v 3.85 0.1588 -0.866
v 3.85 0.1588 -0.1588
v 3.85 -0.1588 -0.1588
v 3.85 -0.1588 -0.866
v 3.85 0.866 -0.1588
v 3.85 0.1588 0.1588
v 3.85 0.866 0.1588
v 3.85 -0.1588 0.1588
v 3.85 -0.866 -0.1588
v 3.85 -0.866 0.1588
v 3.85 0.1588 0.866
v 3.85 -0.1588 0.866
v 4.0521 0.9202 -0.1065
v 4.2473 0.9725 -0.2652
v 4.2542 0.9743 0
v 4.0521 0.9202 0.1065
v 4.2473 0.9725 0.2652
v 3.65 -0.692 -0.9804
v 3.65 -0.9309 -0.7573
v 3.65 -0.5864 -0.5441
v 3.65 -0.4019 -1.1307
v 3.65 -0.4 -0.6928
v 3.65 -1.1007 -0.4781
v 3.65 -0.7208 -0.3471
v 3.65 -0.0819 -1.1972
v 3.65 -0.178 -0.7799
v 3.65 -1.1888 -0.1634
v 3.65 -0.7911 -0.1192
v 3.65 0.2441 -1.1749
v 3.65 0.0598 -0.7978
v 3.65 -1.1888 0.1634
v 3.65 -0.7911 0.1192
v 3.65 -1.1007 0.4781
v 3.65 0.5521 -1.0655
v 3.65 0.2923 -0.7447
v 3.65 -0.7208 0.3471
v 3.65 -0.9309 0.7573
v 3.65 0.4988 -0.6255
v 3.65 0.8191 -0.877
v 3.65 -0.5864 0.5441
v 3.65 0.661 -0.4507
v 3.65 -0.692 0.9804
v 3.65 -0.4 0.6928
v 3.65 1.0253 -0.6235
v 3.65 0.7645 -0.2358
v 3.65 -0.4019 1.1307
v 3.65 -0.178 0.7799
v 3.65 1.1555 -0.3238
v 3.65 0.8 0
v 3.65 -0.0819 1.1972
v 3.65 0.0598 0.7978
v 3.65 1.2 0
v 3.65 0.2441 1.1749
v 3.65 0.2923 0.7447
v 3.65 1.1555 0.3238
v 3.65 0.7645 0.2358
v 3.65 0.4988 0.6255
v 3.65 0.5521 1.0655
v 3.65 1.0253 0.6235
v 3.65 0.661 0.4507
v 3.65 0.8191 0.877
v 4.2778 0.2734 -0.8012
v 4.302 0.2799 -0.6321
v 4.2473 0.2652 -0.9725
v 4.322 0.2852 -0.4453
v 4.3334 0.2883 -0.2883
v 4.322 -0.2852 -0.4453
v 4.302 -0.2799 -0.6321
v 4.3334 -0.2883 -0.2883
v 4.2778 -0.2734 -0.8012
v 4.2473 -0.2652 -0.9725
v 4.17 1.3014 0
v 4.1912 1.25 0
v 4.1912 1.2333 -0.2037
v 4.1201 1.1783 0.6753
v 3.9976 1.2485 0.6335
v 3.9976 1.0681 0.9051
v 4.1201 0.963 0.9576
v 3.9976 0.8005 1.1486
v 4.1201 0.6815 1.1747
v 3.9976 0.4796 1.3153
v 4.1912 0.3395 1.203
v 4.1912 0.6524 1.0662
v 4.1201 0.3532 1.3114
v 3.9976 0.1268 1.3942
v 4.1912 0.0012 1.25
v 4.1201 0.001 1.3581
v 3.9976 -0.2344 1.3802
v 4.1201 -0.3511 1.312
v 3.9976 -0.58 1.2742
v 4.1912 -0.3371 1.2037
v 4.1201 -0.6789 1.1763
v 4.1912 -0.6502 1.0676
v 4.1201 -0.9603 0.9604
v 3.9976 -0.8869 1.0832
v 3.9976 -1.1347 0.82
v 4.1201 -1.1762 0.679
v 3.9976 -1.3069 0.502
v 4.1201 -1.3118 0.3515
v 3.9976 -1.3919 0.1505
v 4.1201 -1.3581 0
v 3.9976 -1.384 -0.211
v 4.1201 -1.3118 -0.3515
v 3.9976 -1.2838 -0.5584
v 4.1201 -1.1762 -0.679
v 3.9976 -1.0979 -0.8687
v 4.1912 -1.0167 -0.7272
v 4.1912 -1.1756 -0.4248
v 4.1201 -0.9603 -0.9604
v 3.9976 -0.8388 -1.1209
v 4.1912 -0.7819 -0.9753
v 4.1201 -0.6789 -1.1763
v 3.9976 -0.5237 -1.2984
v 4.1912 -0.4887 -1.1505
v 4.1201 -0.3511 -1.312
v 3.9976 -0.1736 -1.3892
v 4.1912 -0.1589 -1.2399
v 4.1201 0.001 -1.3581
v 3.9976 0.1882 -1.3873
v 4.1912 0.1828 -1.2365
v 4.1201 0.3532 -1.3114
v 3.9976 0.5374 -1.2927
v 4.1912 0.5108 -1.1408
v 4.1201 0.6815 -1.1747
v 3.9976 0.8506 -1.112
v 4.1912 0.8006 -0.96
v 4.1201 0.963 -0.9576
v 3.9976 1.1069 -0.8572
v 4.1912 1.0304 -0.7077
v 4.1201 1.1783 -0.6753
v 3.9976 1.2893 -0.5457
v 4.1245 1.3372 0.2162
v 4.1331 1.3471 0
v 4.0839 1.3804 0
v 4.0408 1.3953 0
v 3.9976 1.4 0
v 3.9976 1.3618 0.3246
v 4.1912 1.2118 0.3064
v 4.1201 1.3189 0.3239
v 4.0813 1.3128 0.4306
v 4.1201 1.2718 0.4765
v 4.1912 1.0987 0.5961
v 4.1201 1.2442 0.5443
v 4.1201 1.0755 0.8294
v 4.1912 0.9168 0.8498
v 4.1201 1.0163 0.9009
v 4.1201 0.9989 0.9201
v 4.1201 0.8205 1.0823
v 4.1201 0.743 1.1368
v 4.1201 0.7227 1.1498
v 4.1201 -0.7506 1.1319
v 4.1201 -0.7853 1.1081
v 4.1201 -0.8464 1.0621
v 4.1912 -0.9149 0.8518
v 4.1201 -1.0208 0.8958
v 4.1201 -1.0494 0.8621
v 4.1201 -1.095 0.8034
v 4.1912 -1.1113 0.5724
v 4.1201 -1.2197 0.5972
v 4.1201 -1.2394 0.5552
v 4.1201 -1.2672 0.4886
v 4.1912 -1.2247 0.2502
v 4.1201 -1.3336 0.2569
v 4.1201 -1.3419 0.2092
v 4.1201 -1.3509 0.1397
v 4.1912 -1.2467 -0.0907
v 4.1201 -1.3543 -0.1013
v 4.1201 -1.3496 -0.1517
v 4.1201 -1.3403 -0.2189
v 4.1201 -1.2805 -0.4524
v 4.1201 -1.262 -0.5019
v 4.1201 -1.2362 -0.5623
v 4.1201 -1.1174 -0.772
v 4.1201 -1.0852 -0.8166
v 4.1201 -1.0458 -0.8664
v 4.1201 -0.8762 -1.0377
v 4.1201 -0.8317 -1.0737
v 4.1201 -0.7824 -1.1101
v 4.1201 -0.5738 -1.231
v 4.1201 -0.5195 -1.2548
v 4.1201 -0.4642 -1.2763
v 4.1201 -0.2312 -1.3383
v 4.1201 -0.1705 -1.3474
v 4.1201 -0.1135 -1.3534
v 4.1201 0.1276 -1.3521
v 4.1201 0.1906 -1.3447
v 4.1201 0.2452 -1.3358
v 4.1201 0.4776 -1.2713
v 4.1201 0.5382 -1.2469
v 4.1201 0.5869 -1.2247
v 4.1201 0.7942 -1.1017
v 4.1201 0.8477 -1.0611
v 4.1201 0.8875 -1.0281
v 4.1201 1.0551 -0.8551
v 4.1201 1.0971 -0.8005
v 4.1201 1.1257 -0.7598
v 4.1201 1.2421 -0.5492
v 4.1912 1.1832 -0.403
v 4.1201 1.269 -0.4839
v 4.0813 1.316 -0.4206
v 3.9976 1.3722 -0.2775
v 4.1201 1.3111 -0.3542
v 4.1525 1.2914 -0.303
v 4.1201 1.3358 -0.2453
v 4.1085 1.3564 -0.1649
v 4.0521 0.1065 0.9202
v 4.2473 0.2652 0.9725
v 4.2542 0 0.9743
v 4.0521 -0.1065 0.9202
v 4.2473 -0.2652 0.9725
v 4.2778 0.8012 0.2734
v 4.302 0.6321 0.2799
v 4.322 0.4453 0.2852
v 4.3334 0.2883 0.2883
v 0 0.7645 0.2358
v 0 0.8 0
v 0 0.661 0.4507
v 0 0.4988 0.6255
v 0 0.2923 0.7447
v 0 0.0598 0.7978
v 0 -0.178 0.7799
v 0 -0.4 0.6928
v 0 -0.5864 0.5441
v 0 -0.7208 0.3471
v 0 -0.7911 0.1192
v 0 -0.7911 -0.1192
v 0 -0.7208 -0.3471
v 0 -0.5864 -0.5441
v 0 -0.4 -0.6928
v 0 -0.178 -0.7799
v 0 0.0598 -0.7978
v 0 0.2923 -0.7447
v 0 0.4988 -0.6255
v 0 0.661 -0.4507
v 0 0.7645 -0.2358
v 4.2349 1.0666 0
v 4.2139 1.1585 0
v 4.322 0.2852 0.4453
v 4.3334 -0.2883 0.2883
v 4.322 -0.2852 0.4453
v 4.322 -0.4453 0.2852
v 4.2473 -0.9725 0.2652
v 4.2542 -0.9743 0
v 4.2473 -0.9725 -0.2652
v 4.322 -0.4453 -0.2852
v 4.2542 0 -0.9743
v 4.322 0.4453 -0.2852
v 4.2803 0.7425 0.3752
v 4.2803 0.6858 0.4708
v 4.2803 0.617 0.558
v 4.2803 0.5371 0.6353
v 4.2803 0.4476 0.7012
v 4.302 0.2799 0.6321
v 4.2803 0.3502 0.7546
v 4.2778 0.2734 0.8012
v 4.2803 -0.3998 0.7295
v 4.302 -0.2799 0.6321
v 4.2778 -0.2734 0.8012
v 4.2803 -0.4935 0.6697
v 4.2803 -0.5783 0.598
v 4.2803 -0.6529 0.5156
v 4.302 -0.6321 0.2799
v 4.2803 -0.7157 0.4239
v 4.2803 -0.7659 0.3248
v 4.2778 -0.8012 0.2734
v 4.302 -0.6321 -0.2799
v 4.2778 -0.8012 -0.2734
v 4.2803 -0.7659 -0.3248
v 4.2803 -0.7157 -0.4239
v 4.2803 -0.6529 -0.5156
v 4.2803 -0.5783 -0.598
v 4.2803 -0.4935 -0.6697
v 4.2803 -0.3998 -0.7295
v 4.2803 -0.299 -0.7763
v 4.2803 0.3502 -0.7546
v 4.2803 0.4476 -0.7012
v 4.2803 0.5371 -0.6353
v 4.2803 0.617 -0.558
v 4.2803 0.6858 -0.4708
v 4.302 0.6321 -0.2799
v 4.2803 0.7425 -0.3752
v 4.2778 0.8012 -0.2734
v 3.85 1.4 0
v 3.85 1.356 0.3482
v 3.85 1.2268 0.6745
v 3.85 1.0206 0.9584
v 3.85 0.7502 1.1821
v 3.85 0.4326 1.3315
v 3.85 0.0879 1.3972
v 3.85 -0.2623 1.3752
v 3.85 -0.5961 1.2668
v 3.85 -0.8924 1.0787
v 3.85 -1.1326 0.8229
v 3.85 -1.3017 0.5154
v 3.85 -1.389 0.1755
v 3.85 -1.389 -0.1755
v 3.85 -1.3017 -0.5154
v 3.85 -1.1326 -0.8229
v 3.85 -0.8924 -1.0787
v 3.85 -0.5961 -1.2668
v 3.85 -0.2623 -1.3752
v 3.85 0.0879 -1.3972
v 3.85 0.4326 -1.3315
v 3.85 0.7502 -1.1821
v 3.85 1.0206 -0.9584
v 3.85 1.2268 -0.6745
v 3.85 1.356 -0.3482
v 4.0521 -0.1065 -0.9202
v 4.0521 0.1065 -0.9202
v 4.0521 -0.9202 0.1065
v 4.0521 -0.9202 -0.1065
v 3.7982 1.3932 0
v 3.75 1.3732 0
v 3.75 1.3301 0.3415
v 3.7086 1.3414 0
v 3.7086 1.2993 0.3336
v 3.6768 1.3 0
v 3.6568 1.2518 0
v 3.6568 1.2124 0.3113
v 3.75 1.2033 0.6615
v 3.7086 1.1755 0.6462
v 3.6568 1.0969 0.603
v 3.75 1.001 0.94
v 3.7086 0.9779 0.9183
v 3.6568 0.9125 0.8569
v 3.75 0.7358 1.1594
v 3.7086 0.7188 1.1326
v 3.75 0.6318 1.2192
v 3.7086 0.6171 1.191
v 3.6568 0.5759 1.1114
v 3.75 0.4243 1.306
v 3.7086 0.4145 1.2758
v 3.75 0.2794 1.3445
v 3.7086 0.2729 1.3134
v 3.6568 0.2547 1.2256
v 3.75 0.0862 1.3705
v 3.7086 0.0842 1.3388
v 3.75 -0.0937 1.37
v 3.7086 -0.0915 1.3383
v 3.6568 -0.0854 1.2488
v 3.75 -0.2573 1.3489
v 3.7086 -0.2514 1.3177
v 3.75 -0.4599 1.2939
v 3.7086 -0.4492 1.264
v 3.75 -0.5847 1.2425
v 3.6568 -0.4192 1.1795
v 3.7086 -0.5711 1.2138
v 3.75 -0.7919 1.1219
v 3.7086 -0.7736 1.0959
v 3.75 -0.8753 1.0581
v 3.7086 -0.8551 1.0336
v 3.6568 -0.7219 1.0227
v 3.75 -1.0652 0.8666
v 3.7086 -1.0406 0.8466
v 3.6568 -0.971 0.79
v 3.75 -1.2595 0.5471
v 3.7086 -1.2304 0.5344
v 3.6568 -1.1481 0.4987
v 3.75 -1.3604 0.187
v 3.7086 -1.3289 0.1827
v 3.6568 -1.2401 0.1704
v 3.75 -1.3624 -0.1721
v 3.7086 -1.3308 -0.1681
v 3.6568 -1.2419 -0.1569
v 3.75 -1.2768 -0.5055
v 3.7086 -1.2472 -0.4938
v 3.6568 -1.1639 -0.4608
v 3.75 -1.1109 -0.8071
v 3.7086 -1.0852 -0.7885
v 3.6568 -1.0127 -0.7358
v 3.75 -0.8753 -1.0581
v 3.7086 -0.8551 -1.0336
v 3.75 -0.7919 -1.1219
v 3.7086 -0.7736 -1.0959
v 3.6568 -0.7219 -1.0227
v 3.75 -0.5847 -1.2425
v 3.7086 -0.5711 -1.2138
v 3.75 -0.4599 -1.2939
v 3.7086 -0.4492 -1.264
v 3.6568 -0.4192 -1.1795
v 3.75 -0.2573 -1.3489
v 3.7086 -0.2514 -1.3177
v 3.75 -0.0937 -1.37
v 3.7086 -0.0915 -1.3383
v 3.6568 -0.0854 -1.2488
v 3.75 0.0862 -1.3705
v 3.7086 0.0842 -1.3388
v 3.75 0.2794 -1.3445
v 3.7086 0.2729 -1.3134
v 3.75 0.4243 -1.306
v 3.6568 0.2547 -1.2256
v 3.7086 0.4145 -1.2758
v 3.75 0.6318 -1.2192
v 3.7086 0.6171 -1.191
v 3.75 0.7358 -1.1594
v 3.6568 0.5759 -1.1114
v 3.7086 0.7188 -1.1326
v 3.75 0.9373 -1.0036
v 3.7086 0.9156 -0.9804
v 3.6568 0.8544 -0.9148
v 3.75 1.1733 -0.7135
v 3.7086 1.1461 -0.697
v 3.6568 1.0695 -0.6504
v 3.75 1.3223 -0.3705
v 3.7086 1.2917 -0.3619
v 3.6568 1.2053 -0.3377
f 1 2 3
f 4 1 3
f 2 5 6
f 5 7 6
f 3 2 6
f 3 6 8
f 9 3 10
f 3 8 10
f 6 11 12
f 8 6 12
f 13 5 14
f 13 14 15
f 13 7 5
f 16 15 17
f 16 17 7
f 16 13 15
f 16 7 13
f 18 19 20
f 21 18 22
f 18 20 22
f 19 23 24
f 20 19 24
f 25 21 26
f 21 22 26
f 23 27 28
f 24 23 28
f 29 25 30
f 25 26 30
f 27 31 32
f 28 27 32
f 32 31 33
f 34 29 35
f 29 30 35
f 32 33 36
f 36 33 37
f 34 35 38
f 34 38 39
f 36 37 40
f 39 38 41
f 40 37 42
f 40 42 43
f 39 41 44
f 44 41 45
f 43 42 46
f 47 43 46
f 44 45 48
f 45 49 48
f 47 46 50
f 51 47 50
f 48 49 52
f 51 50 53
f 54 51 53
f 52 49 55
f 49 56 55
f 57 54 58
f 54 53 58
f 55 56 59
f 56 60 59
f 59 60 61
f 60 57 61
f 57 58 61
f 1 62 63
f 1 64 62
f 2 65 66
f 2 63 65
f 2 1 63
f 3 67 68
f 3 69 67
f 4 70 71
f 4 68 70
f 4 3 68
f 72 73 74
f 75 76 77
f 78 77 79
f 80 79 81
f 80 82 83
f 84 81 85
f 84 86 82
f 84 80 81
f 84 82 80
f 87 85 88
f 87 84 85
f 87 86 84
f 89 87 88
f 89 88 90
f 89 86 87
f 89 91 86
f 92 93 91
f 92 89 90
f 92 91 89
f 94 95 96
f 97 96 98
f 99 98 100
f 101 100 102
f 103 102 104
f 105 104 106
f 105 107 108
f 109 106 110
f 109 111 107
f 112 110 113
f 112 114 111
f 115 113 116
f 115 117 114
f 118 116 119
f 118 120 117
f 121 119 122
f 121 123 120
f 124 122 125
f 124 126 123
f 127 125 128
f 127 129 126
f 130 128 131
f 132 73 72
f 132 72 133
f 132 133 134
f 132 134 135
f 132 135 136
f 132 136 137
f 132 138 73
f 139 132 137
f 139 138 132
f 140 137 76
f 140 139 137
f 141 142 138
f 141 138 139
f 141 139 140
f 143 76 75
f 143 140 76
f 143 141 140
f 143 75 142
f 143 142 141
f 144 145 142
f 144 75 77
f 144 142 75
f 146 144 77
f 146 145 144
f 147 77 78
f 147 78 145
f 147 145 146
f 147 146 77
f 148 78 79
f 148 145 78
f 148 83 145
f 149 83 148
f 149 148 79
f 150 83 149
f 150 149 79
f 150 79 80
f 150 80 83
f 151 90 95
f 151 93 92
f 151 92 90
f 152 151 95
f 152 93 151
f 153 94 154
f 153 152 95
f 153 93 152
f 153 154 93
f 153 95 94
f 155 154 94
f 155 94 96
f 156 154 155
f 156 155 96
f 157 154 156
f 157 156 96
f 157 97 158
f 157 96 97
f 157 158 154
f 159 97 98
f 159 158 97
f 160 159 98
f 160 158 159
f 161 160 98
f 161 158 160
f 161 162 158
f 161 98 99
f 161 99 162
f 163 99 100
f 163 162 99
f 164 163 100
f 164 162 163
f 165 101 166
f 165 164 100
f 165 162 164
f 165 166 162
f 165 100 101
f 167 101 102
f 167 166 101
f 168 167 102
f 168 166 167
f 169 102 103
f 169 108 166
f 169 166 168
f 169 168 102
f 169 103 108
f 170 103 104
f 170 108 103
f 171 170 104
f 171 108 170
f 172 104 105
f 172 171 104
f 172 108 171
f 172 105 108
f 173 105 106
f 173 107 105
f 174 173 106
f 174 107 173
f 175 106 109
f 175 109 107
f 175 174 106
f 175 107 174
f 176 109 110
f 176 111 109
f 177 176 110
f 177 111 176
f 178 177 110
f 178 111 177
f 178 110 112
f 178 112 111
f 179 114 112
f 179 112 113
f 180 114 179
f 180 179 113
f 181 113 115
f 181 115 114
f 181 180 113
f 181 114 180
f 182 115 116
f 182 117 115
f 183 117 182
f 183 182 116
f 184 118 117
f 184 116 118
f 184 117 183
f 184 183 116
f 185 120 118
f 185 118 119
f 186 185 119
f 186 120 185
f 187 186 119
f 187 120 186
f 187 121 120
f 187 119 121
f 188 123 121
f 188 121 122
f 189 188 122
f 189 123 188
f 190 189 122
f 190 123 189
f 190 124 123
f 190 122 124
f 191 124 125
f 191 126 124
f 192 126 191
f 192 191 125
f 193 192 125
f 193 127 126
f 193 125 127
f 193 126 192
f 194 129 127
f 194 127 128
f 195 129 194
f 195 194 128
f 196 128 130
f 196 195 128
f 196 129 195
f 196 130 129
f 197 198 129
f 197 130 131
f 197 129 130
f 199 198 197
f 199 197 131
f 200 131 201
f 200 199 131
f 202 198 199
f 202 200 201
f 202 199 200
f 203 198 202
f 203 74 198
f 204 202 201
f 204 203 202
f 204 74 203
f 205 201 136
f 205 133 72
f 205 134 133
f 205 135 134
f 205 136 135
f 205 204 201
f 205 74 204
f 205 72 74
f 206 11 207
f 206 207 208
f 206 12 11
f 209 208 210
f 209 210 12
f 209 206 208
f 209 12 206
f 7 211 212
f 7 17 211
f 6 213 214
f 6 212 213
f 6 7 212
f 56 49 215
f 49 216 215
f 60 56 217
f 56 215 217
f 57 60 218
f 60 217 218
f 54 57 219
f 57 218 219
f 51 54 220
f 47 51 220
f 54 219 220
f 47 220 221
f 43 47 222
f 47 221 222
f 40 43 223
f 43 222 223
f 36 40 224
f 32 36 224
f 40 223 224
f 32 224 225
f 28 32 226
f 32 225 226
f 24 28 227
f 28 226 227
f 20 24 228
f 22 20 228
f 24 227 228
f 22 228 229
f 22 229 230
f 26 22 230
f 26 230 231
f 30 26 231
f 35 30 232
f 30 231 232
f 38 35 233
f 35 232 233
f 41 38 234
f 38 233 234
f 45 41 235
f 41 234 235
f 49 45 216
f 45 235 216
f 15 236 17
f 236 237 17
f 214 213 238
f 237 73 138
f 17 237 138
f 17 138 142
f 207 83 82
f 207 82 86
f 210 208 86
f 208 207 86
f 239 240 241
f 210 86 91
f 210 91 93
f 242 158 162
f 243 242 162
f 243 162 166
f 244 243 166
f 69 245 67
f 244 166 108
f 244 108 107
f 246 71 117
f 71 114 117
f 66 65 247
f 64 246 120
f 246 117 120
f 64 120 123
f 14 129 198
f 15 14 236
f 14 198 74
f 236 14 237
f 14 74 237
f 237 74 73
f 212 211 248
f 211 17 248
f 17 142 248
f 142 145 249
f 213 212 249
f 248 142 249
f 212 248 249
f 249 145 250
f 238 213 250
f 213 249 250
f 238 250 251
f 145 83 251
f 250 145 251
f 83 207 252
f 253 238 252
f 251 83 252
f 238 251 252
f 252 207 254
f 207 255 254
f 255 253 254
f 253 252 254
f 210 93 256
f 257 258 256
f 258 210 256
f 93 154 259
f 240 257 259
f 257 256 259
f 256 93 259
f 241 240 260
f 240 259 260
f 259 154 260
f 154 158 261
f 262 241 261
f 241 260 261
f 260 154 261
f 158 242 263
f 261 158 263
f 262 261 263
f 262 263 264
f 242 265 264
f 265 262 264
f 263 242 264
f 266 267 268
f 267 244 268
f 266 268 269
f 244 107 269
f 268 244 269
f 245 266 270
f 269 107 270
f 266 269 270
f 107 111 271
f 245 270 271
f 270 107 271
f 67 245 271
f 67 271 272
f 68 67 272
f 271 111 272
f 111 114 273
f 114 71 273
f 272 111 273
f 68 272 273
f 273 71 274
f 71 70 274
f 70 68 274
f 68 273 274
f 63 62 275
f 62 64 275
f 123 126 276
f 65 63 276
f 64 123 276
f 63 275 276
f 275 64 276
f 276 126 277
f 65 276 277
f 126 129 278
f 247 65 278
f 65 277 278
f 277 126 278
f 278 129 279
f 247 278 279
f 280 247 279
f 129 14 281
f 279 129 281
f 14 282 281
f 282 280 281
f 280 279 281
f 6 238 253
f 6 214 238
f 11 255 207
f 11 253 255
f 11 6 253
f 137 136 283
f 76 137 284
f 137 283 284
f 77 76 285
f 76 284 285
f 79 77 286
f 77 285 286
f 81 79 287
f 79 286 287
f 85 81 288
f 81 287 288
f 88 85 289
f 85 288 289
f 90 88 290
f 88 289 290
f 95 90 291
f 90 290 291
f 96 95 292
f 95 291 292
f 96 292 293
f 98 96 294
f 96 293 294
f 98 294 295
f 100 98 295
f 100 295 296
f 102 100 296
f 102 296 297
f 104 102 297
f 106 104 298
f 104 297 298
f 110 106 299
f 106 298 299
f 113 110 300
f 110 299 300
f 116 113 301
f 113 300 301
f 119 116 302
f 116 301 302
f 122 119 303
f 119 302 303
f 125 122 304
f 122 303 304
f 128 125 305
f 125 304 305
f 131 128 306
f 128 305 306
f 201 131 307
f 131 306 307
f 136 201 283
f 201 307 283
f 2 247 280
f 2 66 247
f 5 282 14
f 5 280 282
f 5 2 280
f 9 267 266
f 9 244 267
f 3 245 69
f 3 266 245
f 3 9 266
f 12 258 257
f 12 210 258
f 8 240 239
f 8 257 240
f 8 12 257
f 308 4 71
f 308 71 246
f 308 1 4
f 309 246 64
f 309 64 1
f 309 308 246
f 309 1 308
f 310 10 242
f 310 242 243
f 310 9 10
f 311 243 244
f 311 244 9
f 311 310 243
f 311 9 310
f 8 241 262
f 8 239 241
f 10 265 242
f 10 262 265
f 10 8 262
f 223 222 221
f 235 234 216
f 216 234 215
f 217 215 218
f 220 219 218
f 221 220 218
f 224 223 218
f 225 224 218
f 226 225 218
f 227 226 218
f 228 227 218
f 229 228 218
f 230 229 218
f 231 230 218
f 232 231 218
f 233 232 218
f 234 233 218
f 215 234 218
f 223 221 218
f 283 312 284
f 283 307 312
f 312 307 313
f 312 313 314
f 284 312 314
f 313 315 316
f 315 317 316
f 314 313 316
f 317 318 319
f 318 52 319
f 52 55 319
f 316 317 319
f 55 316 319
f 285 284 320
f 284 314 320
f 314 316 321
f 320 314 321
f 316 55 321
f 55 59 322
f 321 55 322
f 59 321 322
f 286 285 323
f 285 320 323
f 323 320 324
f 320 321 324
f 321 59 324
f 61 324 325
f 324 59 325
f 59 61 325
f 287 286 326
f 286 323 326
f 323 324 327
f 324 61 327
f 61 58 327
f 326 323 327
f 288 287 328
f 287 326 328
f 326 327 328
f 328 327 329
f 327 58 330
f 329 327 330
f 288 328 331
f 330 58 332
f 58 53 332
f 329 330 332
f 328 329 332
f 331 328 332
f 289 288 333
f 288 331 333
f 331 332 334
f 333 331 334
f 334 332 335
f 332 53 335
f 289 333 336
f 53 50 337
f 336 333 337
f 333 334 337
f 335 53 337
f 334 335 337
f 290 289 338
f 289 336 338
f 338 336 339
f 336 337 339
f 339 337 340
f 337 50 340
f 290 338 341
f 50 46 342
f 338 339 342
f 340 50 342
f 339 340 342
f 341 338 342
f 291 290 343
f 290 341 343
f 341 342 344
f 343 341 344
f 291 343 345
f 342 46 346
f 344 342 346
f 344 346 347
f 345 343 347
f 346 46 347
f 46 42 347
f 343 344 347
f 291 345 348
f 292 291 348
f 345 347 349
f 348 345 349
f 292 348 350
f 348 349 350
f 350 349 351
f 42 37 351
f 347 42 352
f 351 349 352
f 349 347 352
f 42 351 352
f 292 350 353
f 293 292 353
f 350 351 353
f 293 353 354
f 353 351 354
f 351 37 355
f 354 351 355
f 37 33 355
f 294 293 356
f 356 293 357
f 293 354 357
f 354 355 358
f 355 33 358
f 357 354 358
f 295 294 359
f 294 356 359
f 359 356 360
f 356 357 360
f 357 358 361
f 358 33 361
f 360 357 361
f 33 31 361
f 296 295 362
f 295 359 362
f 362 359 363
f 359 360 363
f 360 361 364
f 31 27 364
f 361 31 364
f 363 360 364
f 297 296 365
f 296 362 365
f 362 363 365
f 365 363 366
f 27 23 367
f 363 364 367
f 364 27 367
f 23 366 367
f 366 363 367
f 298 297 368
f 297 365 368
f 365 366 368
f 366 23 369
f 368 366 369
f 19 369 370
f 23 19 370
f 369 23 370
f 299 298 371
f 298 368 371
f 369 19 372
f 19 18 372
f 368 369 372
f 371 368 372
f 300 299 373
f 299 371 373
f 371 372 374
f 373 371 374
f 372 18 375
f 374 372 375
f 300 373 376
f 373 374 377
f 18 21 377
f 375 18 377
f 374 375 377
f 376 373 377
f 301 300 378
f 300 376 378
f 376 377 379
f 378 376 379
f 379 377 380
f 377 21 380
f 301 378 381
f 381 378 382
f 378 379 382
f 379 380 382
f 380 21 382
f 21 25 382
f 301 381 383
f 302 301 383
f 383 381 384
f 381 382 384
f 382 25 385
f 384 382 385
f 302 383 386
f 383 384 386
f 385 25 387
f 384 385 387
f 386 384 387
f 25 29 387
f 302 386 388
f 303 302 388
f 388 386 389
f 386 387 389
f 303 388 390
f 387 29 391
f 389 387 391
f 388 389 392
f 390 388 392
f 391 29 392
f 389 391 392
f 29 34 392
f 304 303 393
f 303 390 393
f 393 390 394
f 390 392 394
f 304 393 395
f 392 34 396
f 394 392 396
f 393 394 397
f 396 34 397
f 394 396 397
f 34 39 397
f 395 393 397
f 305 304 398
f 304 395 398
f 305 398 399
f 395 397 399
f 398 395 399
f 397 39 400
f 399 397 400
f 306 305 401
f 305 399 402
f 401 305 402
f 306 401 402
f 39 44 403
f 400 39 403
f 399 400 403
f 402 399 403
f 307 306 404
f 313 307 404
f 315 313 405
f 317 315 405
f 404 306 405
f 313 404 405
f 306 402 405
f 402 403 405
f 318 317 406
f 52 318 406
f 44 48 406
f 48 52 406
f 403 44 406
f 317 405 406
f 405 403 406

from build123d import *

# Parameters (mm, degrees)
FILLET1_R          = 0.2
CUT_EXTRUDE1_DEPTH = 0.5
CUT_EXTRUDE1_TAPER = 15


with BuildPart() as part:
    # Sketch1 → Revolve1 (revolve)
    with BuildSketch(Plane.XY):
        with BuildLine():
            Line((0, 0), (4.35, 0))
            ThreePointArc((4.35, 0), (4.299747468, 0.707106781), (4.15, 1.4))
            Line((4.15, 1.4), (3.65, 1.4))
            Line((3.65, 1.4), (3.65, 0.8))
            Line((3.65, 0.8), (0, 0.8))
            Line((0, 0.8), (0, 0))
        make_face()
    revolve(axis=Axis((-102.03816923, 0, 0), (1, 0, 0)))

    # Fillet1
    fillet1_edges = [part.edges().sort_by_distance(p)[0] for p in [
        (3.65, -1.4, 0),
        (4.15, -1.4, 0),
    ]]
    fillet(fillet1_edges, radius=FILLET1_R)

    # Sketch2 → Cut-Extrude1 (cut)
    with BuildSketch(Plane(origin=(4.35, 0, 0), x_dir=(0, 0, -1), z_dir=(1, 0, 0))):
        Polygon((0.29273093, 1), (-0.29273093, 1), (-0.29273093, 0.29273093), (-1, 0.29273093), (-1, -0.29273093), (-0.29273093, -0.29273093), (-0.29273093, -1), (0.29273093, -1), (0.29273093, -0.29273093), (1, -0.29273093), (1, 0.29273093), (0.29273093, 0.29273093), align=None)
    extrude(amount=-CUT_EXTRUDE1_DEPTH, taper=CUT_EXTRUDE1_TAPER, mode=Mode.SUBTRACT)


solid = part.part
